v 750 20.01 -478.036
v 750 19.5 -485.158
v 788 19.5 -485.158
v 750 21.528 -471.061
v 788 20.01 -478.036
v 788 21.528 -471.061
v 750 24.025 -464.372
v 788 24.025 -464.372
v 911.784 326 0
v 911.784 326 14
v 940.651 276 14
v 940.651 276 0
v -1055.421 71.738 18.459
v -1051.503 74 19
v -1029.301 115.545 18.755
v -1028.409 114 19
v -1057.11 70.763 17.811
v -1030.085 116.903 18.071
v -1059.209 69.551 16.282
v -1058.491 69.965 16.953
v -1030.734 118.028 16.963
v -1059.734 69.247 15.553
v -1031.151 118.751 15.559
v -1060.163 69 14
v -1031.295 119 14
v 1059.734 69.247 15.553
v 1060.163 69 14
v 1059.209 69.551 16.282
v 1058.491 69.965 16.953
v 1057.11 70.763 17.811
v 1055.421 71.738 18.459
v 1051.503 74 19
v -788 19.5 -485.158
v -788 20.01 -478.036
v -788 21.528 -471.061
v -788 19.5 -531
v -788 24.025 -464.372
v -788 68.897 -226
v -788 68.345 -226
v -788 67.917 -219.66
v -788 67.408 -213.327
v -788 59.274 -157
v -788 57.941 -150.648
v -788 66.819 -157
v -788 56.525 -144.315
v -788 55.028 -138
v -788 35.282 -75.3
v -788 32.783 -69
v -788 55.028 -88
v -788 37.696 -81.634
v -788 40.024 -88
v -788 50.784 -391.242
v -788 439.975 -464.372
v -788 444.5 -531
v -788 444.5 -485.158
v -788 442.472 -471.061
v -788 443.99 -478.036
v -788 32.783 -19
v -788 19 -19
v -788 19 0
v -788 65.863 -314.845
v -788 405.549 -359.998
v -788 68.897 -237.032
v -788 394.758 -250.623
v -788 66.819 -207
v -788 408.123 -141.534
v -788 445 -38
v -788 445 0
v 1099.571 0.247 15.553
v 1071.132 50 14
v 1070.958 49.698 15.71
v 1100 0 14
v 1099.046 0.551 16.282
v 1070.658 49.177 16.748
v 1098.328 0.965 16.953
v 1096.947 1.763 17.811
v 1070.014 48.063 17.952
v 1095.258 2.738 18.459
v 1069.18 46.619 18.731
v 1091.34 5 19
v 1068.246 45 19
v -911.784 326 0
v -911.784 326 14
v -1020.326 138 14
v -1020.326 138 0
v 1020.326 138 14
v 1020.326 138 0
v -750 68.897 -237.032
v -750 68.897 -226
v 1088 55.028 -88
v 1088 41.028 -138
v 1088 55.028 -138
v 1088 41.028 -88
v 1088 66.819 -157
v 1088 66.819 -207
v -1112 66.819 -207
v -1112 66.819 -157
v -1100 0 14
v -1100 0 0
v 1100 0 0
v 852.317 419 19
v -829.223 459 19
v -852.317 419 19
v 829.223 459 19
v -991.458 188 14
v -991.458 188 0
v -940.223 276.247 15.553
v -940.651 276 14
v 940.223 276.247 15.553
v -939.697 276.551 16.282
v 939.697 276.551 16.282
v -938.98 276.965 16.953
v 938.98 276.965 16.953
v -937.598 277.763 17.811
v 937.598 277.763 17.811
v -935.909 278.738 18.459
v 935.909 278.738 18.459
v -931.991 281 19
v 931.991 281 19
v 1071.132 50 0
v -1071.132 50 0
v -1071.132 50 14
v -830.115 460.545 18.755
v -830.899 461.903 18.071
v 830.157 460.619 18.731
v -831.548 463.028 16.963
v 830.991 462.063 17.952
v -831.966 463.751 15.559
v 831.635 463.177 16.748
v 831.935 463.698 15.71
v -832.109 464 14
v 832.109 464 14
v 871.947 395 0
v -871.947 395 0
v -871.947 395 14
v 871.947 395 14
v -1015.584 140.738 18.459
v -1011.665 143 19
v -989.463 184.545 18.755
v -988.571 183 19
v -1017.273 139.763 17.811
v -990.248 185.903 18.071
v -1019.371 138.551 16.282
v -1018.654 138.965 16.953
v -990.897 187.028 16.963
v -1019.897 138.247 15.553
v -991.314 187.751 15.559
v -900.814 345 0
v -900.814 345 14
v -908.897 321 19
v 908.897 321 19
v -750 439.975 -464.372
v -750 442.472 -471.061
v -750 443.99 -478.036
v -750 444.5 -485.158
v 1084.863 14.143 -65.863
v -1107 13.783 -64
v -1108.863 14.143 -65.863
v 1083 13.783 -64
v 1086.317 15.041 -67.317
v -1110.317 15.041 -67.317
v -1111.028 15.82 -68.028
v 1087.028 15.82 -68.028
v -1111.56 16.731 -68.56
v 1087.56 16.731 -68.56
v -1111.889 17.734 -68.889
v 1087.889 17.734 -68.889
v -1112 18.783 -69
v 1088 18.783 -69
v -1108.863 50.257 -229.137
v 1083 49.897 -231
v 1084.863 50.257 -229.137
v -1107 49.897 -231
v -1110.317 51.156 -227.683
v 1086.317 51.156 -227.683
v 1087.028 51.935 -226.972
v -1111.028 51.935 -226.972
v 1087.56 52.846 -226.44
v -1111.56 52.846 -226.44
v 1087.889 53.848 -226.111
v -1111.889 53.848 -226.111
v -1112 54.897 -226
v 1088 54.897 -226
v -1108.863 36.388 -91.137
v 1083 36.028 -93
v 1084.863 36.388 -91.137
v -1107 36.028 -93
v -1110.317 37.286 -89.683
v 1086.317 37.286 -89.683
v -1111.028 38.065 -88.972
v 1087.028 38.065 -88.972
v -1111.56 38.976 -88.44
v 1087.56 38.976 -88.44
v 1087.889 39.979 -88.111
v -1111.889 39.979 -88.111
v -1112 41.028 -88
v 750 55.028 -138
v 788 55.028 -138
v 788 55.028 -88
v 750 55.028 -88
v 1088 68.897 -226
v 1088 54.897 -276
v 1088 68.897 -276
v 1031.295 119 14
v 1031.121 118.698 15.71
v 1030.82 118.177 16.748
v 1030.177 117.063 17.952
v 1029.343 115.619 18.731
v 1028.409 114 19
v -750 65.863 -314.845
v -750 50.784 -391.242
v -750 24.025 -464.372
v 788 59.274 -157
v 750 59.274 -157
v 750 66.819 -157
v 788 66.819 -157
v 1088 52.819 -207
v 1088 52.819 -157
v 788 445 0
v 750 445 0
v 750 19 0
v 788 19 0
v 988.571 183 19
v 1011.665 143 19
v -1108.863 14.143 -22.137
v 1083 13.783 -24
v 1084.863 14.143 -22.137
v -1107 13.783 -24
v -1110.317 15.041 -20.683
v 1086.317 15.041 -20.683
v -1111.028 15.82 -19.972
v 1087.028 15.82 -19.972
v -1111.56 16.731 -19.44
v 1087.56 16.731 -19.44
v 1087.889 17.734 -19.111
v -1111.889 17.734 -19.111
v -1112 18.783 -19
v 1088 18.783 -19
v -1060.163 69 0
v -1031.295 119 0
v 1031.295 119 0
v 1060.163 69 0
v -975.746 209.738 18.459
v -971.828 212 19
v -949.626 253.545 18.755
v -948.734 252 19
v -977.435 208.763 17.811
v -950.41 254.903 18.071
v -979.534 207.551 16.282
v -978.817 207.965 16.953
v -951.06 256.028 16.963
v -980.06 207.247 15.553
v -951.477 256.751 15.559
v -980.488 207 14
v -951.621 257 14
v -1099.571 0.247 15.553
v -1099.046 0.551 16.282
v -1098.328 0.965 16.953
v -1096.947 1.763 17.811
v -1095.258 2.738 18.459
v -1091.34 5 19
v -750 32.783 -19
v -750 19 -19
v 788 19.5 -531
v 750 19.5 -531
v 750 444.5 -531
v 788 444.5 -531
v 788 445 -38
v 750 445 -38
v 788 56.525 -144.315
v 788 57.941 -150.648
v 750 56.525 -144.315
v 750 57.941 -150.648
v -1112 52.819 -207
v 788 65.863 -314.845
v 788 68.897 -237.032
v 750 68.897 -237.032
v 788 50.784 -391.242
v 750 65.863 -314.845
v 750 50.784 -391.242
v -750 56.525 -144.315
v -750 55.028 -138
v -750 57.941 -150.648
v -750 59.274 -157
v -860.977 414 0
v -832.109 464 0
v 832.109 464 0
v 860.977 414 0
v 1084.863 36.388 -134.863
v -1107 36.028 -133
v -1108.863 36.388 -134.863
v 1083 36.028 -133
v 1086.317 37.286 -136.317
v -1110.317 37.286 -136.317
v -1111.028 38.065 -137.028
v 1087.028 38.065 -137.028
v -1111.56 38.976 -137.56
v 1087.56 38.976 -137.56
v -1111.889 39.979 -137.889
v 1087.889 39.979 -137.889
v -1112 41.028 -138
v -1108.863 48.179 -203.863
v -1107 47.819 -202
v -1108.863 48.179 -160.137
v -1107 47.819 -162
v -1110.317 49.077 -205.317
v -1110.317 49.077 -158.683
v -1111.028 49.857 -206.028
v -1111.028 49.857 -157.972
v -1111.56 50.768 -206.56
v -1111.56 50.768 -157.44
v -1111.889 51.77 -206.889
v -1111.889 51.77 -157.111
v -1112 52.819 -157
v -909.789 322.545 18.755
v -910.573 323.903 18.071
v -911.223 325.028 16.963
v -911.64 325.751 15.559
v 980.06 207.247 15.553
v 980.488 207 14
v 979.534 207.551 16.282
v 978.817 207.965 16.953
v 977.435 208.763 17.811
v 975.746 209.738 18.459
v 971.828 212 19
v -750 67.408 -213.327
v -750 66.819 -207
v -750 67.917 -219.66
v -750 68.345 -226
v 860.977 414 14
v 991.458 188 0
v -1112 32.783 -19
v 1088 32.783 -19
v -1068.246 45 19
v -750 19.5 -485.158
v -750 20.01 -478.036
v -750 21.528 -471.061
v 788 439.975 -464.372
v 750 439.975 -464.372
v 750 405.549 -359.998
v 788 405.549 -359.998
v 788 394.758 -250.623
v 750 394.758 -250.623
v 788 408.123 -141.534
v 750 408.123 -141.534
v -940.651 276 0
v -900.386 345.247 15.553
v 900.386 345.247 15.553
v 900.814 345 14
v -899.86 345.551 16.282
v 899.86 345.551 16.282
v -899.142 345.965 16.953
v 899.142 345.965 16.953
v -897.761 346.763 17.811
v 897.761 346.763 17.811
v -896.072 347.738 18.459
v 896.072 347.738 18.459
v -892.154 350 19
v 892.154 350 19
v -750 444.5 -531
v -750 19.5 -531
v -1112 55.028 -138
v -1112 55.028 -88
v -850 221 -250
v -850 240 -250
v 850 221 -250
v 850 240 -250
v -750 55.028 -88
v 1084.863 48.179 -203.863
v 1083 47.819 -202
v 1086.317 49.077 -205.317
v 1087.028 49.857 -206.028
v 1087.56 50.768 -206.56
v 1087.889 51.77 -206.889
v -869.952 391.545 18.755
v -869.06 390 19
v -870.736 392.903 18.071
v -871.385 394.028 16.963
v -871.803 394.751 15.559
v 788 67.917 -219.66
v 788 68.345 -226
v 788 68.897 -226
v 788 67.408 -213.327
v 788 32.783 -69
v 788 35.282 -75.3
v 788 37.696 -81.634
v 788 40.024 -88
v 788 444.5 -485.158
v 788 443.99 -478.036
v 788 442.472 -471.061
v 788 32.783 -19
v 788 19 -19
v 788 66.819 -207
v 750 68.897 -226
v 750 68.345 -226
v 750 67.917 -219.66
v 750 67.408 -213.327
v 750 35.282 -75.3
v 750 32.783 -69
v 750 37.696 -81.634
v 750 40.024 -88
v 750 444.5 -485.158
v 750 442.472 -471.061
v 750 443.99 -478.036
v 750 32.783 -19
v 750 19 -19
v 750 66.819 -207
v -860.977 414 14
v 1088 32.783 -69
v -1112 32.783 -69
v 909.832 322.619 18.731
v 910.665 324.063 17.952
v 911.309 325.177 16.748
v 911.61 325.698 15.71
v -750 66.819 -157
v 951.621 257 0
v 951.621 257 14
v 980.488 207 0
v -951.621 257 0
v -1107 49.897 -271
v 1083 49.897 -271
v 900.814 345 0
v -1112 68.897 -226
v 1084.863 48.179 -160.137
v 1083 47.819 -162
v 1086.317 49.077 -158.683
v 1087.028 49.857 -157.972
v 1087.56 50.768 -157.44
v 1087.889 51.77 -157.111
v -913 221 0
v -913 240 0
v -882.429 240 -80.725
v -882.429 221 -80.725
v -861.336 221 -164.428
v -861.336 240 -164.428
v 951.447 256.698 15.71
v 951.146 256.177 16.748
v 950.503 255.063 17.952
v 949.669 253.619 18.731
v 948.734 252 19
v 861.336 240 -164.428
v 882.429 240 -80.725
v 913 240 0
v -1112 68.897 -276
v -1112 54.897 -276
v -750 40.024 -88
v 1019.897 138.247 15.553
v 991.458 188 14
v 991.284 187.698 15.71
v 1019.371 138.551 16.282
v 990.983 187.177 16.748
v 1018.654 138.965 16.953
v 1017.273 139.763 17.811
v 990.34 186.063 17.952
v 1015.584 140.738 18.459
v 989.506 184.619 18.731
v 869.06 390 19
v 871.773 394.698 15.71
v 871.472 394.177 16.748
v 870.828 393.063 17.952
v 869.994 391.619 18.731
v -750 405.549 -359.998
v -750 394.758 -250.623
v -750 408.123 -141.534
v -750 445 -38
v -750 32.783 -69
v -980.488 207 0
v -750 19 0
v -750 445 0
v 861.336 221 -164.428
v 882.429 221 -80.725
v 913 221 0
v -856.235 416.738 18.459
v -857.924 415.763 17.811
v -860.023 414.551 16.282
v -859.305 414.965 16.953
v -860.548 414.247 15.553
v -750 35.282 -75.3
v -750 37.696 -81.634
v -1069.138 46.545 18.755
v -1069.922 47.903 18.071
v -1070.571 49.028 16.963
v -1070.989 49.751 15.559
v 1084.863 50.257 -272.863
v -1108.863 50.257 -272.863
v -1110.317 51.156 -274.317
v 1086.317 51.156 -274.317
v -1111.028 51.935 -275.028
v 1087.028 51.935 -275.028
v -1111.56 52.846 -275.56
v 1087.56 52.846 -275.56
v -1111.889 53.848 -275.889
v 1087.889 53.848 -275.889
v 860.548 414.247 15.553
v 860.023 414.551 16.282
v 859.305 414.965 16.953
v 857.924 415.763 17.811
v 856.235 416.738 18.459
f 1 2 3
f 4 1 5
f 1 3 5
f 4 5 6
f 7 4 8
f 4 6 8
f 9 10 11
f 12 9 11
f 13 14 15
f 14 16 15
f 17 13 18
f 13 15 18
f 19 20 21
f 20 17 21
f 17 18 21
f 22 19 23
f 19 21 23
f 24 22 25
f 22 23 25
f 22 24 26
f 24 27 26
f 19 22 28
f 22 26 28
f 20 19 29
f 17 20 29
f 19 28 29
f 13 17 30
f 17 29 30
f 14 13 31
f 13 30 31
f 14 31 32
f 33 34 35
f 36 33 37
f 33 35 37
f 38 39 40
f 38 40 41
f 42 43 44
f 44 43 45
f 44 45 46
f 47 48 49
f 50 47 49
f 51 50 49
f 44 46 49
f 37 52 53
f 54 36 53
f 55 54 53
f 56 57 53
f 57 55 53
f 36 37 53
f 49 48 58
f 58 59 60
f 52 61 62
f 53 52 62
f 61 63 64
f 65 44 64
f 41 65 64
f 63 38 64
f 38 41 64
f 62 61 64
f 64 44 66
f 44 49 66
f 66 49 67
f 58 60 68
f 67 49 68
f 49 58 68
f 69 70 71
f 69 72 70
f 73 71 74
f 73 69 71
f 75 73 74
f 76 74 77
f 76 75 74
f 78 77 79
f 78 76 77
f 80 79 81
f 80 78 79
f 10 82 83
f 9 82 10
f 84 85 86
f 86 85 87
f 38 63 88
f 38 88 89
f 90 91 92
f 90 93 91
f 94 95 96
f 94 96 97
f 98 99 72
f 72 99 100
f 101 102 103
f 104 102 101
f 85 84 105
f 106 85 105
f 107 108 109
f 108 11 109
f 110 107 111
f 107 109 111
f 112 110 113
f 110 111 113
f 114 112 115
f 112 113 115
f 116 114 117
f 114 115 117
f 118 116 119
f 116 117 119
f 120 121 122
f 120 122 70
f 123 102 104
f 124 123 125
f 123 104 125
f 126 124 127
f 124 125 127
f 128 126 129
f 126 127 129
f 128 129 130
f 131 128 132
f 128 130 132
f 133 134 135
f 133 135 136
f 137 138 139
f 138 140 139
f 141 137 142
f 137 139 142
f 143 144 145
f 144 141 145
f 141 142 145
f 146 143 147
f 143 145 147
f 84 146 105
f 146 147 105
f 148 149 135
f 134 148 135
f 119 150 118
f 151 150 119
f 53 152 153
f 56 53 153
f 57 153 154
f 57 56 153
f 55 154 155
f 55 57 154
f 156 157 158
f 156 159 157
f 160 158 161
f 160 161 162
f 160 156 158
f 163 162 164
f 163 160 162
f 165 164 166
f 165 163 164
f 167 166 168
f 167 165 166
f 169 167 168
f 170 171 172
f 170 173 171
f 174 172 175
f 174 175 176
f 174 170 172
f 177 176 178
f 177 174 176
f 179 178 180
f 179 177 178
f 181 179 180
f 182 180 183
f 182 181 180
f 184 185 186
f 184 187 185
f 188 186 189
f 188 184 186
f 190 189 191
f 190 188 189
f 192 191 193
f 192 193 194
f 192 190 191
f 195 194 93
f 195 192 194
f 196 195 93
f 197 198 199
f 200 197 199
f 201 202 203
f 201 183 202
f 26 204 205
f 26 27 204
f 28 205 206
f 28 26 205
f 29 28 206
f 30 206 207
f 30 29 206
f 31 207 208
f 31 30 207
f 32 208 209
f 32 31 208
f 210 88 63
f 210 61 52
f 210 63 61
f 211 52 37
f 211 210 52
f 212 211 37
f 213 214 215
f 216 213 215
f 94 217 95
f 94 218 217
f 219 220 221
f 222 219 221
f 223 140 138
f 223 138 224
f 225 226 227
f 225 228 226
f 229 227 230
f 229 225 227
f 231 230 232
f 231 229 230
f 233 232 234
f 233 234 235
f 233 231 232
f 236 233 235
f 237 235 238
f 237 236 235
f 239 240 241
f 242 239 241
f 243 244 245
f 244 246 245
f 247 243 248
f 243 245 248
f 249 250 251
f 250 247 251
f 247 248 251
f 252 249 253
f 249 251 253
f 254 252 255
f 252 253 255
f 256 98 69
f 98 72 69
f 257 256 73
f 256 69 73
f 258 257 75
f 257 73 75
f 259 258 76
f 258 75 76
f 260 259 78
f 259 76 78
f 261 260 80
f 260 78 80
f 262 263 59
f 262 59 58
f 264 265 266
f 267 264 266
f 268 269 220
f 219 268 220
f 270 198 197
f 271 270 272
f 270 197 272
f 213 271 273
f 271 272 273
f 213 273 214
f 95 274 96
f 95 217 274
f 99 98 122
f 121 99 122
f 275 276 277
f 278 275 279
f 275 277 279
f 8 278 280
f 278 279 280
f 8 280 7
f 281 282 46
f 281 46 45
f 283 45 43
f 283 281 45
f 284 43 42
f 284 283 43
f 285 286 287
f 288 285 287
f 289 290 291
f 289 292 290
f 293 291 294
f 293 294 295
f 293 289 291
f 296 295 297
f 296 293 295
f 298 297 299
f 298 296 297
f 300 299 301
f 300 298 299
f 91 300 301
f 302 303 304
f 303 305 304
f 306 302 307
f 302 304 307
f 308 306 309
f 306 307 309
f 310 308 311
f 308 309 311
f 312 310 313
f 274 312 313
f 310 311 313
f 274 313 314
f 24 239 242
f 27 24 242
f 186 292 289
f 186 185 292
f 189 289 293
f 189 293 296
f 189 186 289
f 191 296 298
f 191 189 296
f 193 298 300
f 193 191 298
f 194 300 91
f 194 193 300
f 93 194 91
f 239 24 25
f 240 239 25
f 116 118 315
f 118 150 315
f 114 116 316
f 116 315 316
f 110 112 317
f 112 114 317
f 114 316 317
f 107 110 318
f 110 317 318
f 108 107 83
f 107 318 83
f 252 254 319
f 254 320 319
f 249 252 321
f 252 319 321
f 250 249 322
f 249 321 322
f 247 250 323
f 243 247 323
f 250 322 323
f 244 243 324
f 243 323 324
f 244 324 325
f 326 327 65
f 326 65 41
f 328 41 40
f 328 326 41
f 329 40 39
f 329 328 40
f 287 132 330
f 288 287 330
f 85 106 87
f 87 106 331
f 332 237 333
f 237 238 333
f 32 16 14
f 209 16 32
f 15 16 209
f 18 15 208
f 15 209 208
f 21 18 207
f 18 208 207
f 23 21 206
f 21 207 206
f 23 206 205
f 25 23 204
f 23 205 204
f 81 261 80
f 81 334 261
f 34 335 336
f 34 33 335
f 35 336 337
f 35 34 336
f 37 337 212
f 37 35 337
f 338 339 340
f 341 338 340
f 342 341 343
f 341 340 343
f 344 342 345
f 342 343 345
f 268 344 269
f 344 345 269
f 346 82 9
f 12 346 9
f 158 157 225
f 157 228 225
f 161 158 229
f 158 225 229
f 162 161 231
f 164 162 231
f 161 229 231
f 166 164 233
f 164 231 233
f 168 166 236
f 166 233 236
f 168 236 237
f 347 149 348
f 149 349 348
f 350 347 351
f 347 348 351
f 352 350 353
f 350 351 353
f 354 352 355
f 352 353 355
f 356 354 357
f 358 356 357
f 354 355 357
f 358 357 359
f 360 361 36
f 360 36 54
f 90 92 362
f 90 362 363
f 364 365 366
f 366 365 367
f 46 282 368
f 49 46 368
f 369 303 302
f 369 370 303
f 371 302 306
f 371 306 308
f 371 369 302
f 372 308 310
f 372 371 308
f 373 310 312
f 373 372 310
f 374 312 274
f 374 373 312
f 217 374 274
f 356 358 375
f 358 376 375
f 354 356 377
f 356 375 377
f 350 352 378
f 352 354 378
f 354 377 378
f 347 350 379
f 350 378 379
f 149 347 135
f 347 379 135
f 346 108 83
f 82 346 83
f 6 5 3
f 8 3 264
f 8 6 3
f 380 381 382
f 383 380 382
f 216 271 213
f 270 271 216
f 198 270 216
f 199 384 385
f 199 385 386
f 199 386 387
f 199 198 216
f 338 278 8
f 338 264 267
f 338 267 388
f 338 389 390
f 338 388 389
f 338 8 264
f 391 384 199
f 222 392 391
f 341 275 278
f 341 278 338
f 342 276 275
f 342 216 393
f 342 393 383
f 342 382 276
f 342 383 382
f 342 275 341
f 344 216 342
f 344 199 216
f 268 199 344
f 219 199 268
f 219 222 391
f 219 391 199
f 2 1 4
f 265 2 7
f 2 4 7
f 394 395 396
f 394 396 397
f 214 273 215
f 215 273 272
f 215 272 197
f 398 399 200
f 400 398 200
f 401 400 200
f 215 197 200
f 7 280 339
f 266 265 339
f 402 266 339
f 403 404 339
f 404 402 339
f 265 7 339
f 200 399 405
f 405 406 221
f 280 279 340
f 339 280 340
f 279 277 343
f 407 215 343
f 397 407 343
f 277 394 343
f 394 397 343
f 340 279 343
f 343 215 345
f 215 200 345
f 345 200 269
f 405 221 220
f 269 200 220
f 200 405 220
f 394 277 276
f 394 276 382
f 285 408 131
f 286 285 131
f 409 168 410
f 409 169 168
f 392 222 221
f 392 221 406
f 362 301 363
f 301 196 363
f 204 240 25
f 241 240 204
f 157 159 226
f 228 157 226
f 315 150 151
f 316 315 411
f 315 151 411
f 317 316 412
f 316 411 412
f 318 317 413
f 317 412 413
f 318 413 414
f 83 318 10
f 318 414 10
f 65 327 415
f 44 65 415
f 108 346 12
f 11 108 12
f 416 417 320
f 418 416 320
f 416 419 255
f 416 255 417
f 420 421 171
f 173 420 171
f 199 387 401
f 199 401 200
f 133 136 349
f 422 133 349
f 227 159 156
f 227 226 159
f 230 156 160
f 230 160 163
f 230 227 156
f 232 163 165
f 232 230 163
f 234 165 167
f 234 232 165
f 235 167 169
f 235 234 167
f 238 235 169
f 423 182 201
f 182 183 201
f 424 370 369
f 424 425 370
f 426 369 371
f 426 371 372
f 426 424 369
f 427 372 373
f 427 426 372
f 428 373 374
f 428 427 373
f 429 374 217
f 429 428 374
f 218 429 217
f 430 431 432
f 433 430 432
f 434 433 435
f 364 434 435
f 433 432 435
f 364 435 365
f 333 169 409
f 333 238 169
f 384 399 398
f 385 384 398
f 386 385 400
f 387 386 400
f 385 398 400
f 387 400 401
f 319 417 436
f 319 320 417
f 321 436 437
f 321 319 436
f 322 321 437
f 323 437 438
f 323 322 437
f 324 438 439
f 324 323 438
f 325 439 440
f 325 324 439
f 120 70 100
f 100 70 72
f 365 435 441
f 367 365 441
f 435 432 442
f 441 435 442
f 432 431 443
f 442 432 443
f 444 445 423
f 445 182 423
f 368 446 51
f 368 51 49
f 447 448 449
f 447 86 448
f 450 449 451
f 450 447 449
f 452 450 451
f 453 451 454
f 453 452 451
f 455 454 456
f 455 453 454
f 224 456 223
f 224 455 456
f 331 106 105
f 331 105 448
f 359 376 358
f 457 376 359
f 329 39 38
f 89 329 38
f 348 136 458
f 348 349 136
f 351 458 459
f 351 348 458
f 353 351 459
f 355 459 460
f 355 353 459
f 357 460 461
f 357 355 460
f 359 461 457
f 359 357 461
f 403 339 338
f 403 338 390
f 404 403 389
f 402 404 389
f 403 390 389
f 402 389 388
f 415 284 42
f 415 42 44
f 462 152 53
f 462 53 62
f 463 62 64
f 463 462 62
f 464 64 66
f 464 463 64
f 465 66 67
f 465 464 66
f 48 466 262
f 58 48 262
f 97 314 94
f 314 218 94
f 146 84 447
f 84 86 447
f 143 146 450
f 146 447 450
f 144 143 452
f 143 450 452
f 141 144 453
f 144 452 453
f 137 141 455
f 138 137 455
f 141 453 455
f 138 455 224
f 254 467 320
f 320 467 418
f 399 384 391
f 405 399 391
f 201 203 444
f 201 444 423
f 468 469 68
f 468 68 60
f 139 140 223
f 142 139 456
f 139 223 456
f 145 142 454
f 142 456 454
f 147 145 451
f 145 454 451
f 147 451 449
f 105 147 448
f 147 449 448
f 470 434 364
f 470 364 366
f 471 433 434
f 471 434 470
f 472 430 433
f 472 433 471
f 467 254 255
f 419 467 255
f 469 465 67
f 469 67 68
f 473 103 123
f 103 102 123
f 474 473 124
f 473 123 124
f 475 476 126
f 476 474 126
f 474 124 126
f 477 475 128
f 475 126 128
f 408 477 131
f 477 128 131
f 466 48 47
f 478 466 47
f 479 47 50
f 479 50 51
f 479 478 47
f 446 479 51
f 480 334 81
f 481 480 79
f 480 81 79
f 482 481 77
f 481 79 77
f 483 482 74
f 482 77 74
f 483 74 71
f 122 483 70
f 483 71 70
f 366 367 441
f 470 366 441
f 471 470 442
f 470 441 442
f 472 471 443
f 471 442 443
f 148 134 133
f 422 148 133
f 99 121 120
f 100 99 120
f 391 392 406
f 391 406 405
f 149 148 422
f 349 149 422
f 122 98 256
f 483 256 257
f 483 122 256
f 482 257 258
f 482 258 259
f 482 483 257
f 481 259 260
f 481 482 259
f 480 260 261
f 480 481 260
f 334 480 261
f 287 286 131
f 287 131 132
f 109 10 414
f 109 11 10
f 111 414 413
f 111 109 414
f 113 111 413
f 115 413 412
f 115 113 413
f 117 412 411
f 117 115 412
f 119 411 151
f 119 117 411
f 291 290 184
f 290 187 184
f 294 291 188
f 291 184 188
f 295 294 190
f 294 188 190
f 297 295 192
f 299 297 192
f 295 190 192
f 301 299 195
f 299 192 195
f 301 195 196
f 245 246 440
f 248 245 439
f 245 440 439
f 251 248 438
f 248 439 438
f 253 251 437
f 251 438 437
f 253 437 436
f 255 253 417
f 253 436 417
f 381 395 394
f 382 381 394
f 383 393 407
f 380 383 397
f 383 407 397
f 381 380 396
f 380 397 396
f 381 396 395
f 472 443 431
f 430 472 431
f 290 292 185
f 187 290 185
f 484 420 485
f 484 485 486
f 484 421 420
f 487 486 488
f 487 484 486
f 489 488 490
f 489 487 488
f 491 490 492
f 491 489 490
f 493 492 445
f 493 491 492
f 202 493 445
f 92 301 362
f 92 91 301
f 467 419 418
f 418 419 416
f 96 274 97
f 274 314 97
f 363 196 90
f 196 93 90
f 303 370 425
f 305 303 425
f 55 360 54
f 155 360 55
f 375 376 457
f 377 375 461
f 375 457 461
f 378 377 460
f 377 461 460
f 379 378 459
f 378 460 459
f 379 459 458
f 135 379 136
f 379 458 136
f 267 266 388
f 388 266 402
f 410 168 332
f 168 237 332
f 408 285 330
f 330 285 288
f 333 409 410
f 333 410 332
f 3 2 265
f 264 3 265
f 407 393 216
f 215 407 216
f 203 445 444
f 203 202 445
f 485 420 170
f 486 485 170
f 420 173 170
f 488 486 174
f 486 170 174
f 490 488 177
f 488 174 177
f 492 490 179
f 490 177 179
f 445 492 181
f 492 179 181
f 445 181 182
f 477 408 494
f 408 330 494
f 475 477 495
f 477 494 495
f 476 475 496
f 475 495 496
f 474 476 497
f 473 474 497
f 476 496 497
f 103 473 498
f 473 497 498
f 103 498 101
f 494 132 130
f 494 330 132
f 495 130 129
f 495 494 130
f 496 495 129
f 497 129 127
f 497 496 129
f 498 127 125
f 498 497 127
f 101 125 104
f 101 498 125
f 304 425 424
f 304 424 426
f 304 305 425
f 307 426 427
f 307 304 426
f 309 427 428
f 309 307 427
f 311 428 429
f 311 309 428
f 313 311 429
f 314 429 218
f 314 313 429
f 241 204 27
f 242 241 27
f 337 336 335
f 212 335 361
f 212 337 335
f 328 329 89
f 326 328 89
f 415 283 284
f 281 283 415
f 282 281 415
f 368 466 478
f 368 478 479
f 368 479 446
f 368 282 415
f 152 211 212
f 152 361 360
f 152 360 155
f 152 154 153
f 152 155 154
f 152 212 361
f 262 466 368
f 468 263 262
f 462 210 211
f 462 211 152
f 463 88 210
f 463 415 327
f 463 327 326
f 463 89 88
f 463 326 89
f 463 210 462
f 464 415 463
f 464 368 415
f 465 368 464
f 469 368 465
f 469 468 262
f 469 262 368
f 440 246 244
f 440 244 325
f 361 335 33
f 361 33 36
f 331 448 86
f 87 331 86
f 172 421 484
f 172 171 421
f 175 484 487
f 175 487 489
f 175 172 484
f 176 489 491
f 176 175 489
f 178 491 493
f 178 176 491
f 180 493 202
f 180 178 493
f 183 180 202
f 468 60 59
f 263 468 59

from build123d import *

# Parameters (mm, degrees)
F0_W           = 2200
F0_H           = 50
F1_DEPTH       = 19
F4_DEPTH       = 38
F8_DEPTH       = 19
F10_DEPTH      = 550.001
F11_R          = 5
F11_2_R        = 5
F11_3_R        = 5
F11_4_R        = 5
F11_5_R        = 5
F11_6_R        = 5
F11_7_R        = 5
F12_W          = 19
F12_H          = 50
F13_DEPTH      = 1888.001
F14_DEPTH      = 300
F14_DEPTH_BACK = 1900
F15_R          = 5
F15_2_R        = 5
F15_3_R        = 5
F15_4_R        = 5
F16_R          = 50
F16_2_R        = 50


with BuildPart() as f1:
    # F0 (on Top) → F1 (new body)
    with BuildSketch(Plane.XY):
        with Locations((0, 25)):
            Rectangle(F0_W, F0_H)
    extrude(amount=F1_DEPTH)


with BuildPart() as f1b:
    # F0 (on Top) → F1, piece 2 (new body)
    with BuildSketch(Plane.XY):
        with Locations((0, 94)):
            Rectangle(F0_W, F0_H)
    extrude(amount=F1_DEPTH)


with BuildPart() as f1c:
    # F0 (on Top) → F1, piece 3 (new body)
    with BuildSketch(Plane.XY):
        with Locations((0, 163)):
            Rectangle(F0_W, F0_H)
    extrude(amount=F1_DEPTH)


with BuildPart() as f1d:
    # F0 (on Top) → F1, piece 4 (new body)
    with BuildSketch(Plane.XY):
        with Locations((0, 232)):
            Rectangle(F0_W, F0_H)
    extrude(amount=F1_DEPTH)


with BuildPart() as f1e:
    # F0 (on Top) → F1, piece 5 (new body)
    with BuildSketch(Plane.XY):
        with Locations((0, 301)):
            Rectangle(F0_W, F0_H)
    extrude(amount=F1_DEPTH)


with BuildPart() as f1f:
    # F0 (on Top) → F1, piece 6 (new body)
    with BuildSketch(Plane.XY):
        with Locations((0, 370)):
            Rectangle(F0_W, F0_H)
    extrude(amount=F1_DEPTH)


with BuildPart() as f1g:
    # F0 (on Top) → F1, piece 7 (new body)
    with BuildSketch(Plane.XY):
        with Locations((0, 439)):
            Rectangle(F0_W, F0_H)
    extrude(amount=F1_DEPTH)


with BuildPart() as f4:
    # F3 (on offset) → F4 (new body)
    with BuildSketch(Plane.YZ.offset(750)):
        with BuildLine():
            Line((445, 0), (19, 0))
            Line((19, 0), (19, -38))
            ThreePointArc((19, -38), (69.2767040097, -255.9426299266), (19.5, -474))
            Line((19.5, -474), (19.5, -531))
            Line((19.5, -531), (444.5, -531))
            Line((444.5, -531), (444.5, -474))
            ThreePointArc((444.5, -474), (394.7232959903, -255.9426299266), (445, -38))
            Line((445, -38), (445, 0))
        make_face()
    extrude(amount=F4_DEPTH)


with BuildPart() as f5_1:
    # F5: instance of F4
    add(f4.part.mirror(Plane.YZ))


with BuildPart() as f8:
    # F7 (on offset) → F8 (new body)
    with BuildSketch(Plane.XZ.offset(-240)):
        with BuildLine():
            Line((913, 0), (-913, 0))
            ThreePointArc((-913, 0), (-870.6771431048, -122.2726400624), (-850, -250))
            Line((-850, -250), (850, -250))
            ThreePointArc((850, -250), (870.6771431048, -122.2726400624), (913, 0))
        make_face()
    extrude(amount=F8_DEPTH)


with BuildPart() as f10_tool:
    # F9 (on face) → F10 (new body, through all)
    with BuildSketch(Plane.XY.offset(19)):
        Polygon((-1100, 464), (-1100, 0), (-832.109475096, 464), align=None)
        Polygon((832.109475096, 464), (1100, 0), (1100, 464), align=None)
    extrude(amount=-F10_DEPTH)


with BuildPart() as f1_1:
    add(f1.part)

    # F10: cut by f10_tool
    add(f10_tool.part, mode=Mode.SUBTRACT)

    # F11
    f11_edges = [f1_1.edges().sort_by_distance(p)[0] for p in [
        (0, 0, 19),
        (1085.566243, 25, 19),
        (0, 50, 19),
        (-1085.566243, 25, 19),
    ]]
    fillet(f11_edges, radius=F11_R)


with BuildPart() as f1b_1:
    add(f1b.part)

    # F10: cut by f10_tool
    add(f10_tool.part, mode=Mode.SUBTRACT)

    # F11#2
    f11_2_edges = [f1b_1.edges().sort_by_distance(p)[0] for p in [
        (1045.729075, 94, 19),
        (0, 69, 19),
        (0, 119, 19),
        (-1045.729075, 94, 19),
    ]]
    fillet(f11_2_edges, radius=F11_2_R)


with BuildPart() as f1c_1:
    add(f1c.part)

    # F10: cut by f10_tool
    add(f10_tool.part, mode=Mode.SUBTRACT)

    # F11#3
    f11_3_edges = [f1c_1.edges().sort_by_distance(p)[0] for p in [
        (1005.891906, 163, 19),
        (0, 138, 19),
        (0, 188, 19),
        (-1005.891906, 163, 19),
    ]]
    fillet(f11_3_edges, radius=F11_3_R)


with BuildPart() as f1d_1:
    add(f1d.part)

    # F10: cut by f10_tool
    add(f10_tool.part, mode=Mode.SUBTRACT)

    # F11#4
    f11_4_edges = [f1d_1.edges().sort_by_distance(p)[0] for p in [
        (966.054738, 232, 19),
        (0, 207, 19),
        (0, 257, 19),
        (-966.054738, 232, 19),
    ]]
    fillet(f11_4_edges, radius=F11_4_R)


with BuildPart() as f1e_1:
    add(f1e.part)

    # F10: cut by f10_tool
    add(f10_tool.part, mode=Mode.SUBTRACT)

    # F11#5
    f11_5_edges = [f1e_1.edges().sort_by_distance(p)[0] for p in [
        (926.217569, 301, 19),
        (0, 276, 19),
        (0, 326, 19),
        (-926.217569, 301, 19),
    ]]
    fillet(f11_5_edges, radius=F11_5_R)


with BuildPart() as f1f_1:
    add(f1f.part)

    # F10: cut by f10_tool
    add(f10_tool.part, mode=Mode.SUBTRACT)

    # F11#6
    f11_6_edges = [f1f_1.edges().sort_by_distance(p)[0] for p in [
        (886.3804, 370, 19),
        (0, 345, 19),
        (0, 395, 19),
        (-886.3804, 370, 19),
    ]]
    fillet(f11_6_edges, radius=F11_6_R)


with BuildPart() as f1g_1:
    add(f1g.part)

    # F10: cut by f10_tool
    add(f10_tool.part, mode=Mode.SUBTRACT)

    # F11#7
    f11_7_edges = [f1g_1.edges().sort_by_distance(p)[0] for p in [
        (846.543232, 439, 19),
        (0, 414, 19),
        (0, 464, 19),
        (-846.543232, 439, 19),
    ]]
    fillet(f11_7_edges, radius=F11_7_R)


with BuildPart() as f13_tool:
    # F12 (on face) → F13 (new body, through all)
    with BuildSketch(Plane.YZ.offset(788)):
        with Locations((23.2829558665, -44)):
            Rectangle(F12_W, F12_H)
        with Locations((45.5279484301, -113)):
            Rectangle(F12_W, F12_H)
        with Locations((57.3191549901, -182)):
            Rectangle(F12_W, F12_H)
        with Locations((59.3972632467, -251)):
            Rectangle(F12_W, F12_H)
    extrude(amount=-F13_DEPTH)


with BuildPart() as f4_1:
    add(f4.part)

    # F13: cut by f13_tool
    add(f13_tool.part, mode=Mode.SUBTRACT)

    # F16
    f16_edges = [f4_1.edges().sort_by_distance(p)[0] for p in [
        (769, 19.5, -474),
        (769, 444.5, -474),
    ]]
    fillet(f16_edges, radius=F16_R)


with BuildPart() as f5_1_1:
    add(f5_1.part)

    # F13: cut by f13_tool
    add(f13_tool.part, mode=Mode.SUBTRACT)

    # F16#2
    f16_2_edges = [f5_1_1.edges().sort_by_distance(p)[0] for p in [
        (-769, 19.5, -474),
        (-769, 444.5, -474),
    ]]
    fillet(f16_2_edges, radius=F16_2_R)


with BuildPart() as f14:
    # F12 (on face) → F14 (new body, two sides)
    with BuildSketch(Plane.YZ.offset(788)) as f14_sk:
        with Locations((23.2829558665, -44)):
            Rectangle(F12_W, F12_H)
    extrude(amount=F14_DEPTH)
    extrude(f14_sk.sketch, amount=-F14_DEPTH_BACK)

    # F15
    f15_edges = [f14.edges().sort_by_distance(p)[0] for p in [
        (-12, 13.782956, -19),
        (1088, 13.782956, -44),
        (-12, 13.782956, -69),
        (-1112, 13.782956, -44),
    ]]
    fillet(f15_edges, radius=F15_R)


with BuildPart() as f14b:
    # F12 (on face) → F14, piece 2 (new body, two sides)
    with BuildSketch(Plane.YZ.offset(788)) as f14_2_sk:
        with Locations((45.5279484301, -113)):
            Rectangle(F12_W, F12_H)
    extrude(amount=F14_DEPTH)
    extrude(f14_2_sk.sketch, amount=-F14_DEPTH_BACK)

    # F15#2
    f15_2_edges = [f14b.edges().sort_by_distance(p)[0] for p in [
        (-12, 36.027948, -88),
        (1088, 36.027948, -113),
        (-12, 36.027948, -138),
        (-1112, 36.027948, -113),
    ]]
    fillet(f15_2_edges, radius=F15_2_R)


with BuildPart() as f14c:
    # F12 (on face) → F14, piece 3 (new body, two sides)
    with BuildSketch(Plane.YZ.offset(788)) as f14_3_sk:
        with Locations((57.3191549901, -182)):
            Rectangle(F12_W, F12_H)
    extrude(amount=F14_DEPTH)
    extrude(f14_3_sk.sketch, amount=-F14_DEPTH_BACK)

    # F15#3
    f15_3_edges = [f14c.edges().sort_by_distance(p)[0] for p in [
        (-12, 47.819155, -157),
        (1088, 47.819155, -182),
        (-12, 47.819155, -207),
        (-1112, 47.819155, -182),
    ]]
    fillet(f15_3_edges, radius=F15_3_R)


with BuildPart() as f14d:
    # F12 (on face) → F14, piece 4 (new body, two sides)
    with BuildSketch(Plane.YZ.offset(788)) as f14_4_sk:
        with Locations((59.3972632467, -251)):
            Rectangle(F12_W, F12_H)
    extrude(amount=F14_DEPTH)
    extrude(f14_4_sk.sketch, amount=-F14_DEPTH_BACK)

    # F15#4
    f15_4_edges = [f14d.edges().sort_by_distance(p)[0] for p in [
        (-12, 49.897263, -276),
        (-12, 49.897263, -226),
        (1088, 49.897263, -251),
        (-1112, 49.897263, -251),
    ]]
    fillet(f15_4_edges, radius=F15_4_R)


solid = Compound([f8.part, f1_1.part, f1b_1.part, f1c_1.part, f1d_1.part, f1e_1.part, f1f_1.part, f1g_1.part, f4_1.part, f5_1_1.part, f14.part, f14b.part, f14c.part, f14d.part])
